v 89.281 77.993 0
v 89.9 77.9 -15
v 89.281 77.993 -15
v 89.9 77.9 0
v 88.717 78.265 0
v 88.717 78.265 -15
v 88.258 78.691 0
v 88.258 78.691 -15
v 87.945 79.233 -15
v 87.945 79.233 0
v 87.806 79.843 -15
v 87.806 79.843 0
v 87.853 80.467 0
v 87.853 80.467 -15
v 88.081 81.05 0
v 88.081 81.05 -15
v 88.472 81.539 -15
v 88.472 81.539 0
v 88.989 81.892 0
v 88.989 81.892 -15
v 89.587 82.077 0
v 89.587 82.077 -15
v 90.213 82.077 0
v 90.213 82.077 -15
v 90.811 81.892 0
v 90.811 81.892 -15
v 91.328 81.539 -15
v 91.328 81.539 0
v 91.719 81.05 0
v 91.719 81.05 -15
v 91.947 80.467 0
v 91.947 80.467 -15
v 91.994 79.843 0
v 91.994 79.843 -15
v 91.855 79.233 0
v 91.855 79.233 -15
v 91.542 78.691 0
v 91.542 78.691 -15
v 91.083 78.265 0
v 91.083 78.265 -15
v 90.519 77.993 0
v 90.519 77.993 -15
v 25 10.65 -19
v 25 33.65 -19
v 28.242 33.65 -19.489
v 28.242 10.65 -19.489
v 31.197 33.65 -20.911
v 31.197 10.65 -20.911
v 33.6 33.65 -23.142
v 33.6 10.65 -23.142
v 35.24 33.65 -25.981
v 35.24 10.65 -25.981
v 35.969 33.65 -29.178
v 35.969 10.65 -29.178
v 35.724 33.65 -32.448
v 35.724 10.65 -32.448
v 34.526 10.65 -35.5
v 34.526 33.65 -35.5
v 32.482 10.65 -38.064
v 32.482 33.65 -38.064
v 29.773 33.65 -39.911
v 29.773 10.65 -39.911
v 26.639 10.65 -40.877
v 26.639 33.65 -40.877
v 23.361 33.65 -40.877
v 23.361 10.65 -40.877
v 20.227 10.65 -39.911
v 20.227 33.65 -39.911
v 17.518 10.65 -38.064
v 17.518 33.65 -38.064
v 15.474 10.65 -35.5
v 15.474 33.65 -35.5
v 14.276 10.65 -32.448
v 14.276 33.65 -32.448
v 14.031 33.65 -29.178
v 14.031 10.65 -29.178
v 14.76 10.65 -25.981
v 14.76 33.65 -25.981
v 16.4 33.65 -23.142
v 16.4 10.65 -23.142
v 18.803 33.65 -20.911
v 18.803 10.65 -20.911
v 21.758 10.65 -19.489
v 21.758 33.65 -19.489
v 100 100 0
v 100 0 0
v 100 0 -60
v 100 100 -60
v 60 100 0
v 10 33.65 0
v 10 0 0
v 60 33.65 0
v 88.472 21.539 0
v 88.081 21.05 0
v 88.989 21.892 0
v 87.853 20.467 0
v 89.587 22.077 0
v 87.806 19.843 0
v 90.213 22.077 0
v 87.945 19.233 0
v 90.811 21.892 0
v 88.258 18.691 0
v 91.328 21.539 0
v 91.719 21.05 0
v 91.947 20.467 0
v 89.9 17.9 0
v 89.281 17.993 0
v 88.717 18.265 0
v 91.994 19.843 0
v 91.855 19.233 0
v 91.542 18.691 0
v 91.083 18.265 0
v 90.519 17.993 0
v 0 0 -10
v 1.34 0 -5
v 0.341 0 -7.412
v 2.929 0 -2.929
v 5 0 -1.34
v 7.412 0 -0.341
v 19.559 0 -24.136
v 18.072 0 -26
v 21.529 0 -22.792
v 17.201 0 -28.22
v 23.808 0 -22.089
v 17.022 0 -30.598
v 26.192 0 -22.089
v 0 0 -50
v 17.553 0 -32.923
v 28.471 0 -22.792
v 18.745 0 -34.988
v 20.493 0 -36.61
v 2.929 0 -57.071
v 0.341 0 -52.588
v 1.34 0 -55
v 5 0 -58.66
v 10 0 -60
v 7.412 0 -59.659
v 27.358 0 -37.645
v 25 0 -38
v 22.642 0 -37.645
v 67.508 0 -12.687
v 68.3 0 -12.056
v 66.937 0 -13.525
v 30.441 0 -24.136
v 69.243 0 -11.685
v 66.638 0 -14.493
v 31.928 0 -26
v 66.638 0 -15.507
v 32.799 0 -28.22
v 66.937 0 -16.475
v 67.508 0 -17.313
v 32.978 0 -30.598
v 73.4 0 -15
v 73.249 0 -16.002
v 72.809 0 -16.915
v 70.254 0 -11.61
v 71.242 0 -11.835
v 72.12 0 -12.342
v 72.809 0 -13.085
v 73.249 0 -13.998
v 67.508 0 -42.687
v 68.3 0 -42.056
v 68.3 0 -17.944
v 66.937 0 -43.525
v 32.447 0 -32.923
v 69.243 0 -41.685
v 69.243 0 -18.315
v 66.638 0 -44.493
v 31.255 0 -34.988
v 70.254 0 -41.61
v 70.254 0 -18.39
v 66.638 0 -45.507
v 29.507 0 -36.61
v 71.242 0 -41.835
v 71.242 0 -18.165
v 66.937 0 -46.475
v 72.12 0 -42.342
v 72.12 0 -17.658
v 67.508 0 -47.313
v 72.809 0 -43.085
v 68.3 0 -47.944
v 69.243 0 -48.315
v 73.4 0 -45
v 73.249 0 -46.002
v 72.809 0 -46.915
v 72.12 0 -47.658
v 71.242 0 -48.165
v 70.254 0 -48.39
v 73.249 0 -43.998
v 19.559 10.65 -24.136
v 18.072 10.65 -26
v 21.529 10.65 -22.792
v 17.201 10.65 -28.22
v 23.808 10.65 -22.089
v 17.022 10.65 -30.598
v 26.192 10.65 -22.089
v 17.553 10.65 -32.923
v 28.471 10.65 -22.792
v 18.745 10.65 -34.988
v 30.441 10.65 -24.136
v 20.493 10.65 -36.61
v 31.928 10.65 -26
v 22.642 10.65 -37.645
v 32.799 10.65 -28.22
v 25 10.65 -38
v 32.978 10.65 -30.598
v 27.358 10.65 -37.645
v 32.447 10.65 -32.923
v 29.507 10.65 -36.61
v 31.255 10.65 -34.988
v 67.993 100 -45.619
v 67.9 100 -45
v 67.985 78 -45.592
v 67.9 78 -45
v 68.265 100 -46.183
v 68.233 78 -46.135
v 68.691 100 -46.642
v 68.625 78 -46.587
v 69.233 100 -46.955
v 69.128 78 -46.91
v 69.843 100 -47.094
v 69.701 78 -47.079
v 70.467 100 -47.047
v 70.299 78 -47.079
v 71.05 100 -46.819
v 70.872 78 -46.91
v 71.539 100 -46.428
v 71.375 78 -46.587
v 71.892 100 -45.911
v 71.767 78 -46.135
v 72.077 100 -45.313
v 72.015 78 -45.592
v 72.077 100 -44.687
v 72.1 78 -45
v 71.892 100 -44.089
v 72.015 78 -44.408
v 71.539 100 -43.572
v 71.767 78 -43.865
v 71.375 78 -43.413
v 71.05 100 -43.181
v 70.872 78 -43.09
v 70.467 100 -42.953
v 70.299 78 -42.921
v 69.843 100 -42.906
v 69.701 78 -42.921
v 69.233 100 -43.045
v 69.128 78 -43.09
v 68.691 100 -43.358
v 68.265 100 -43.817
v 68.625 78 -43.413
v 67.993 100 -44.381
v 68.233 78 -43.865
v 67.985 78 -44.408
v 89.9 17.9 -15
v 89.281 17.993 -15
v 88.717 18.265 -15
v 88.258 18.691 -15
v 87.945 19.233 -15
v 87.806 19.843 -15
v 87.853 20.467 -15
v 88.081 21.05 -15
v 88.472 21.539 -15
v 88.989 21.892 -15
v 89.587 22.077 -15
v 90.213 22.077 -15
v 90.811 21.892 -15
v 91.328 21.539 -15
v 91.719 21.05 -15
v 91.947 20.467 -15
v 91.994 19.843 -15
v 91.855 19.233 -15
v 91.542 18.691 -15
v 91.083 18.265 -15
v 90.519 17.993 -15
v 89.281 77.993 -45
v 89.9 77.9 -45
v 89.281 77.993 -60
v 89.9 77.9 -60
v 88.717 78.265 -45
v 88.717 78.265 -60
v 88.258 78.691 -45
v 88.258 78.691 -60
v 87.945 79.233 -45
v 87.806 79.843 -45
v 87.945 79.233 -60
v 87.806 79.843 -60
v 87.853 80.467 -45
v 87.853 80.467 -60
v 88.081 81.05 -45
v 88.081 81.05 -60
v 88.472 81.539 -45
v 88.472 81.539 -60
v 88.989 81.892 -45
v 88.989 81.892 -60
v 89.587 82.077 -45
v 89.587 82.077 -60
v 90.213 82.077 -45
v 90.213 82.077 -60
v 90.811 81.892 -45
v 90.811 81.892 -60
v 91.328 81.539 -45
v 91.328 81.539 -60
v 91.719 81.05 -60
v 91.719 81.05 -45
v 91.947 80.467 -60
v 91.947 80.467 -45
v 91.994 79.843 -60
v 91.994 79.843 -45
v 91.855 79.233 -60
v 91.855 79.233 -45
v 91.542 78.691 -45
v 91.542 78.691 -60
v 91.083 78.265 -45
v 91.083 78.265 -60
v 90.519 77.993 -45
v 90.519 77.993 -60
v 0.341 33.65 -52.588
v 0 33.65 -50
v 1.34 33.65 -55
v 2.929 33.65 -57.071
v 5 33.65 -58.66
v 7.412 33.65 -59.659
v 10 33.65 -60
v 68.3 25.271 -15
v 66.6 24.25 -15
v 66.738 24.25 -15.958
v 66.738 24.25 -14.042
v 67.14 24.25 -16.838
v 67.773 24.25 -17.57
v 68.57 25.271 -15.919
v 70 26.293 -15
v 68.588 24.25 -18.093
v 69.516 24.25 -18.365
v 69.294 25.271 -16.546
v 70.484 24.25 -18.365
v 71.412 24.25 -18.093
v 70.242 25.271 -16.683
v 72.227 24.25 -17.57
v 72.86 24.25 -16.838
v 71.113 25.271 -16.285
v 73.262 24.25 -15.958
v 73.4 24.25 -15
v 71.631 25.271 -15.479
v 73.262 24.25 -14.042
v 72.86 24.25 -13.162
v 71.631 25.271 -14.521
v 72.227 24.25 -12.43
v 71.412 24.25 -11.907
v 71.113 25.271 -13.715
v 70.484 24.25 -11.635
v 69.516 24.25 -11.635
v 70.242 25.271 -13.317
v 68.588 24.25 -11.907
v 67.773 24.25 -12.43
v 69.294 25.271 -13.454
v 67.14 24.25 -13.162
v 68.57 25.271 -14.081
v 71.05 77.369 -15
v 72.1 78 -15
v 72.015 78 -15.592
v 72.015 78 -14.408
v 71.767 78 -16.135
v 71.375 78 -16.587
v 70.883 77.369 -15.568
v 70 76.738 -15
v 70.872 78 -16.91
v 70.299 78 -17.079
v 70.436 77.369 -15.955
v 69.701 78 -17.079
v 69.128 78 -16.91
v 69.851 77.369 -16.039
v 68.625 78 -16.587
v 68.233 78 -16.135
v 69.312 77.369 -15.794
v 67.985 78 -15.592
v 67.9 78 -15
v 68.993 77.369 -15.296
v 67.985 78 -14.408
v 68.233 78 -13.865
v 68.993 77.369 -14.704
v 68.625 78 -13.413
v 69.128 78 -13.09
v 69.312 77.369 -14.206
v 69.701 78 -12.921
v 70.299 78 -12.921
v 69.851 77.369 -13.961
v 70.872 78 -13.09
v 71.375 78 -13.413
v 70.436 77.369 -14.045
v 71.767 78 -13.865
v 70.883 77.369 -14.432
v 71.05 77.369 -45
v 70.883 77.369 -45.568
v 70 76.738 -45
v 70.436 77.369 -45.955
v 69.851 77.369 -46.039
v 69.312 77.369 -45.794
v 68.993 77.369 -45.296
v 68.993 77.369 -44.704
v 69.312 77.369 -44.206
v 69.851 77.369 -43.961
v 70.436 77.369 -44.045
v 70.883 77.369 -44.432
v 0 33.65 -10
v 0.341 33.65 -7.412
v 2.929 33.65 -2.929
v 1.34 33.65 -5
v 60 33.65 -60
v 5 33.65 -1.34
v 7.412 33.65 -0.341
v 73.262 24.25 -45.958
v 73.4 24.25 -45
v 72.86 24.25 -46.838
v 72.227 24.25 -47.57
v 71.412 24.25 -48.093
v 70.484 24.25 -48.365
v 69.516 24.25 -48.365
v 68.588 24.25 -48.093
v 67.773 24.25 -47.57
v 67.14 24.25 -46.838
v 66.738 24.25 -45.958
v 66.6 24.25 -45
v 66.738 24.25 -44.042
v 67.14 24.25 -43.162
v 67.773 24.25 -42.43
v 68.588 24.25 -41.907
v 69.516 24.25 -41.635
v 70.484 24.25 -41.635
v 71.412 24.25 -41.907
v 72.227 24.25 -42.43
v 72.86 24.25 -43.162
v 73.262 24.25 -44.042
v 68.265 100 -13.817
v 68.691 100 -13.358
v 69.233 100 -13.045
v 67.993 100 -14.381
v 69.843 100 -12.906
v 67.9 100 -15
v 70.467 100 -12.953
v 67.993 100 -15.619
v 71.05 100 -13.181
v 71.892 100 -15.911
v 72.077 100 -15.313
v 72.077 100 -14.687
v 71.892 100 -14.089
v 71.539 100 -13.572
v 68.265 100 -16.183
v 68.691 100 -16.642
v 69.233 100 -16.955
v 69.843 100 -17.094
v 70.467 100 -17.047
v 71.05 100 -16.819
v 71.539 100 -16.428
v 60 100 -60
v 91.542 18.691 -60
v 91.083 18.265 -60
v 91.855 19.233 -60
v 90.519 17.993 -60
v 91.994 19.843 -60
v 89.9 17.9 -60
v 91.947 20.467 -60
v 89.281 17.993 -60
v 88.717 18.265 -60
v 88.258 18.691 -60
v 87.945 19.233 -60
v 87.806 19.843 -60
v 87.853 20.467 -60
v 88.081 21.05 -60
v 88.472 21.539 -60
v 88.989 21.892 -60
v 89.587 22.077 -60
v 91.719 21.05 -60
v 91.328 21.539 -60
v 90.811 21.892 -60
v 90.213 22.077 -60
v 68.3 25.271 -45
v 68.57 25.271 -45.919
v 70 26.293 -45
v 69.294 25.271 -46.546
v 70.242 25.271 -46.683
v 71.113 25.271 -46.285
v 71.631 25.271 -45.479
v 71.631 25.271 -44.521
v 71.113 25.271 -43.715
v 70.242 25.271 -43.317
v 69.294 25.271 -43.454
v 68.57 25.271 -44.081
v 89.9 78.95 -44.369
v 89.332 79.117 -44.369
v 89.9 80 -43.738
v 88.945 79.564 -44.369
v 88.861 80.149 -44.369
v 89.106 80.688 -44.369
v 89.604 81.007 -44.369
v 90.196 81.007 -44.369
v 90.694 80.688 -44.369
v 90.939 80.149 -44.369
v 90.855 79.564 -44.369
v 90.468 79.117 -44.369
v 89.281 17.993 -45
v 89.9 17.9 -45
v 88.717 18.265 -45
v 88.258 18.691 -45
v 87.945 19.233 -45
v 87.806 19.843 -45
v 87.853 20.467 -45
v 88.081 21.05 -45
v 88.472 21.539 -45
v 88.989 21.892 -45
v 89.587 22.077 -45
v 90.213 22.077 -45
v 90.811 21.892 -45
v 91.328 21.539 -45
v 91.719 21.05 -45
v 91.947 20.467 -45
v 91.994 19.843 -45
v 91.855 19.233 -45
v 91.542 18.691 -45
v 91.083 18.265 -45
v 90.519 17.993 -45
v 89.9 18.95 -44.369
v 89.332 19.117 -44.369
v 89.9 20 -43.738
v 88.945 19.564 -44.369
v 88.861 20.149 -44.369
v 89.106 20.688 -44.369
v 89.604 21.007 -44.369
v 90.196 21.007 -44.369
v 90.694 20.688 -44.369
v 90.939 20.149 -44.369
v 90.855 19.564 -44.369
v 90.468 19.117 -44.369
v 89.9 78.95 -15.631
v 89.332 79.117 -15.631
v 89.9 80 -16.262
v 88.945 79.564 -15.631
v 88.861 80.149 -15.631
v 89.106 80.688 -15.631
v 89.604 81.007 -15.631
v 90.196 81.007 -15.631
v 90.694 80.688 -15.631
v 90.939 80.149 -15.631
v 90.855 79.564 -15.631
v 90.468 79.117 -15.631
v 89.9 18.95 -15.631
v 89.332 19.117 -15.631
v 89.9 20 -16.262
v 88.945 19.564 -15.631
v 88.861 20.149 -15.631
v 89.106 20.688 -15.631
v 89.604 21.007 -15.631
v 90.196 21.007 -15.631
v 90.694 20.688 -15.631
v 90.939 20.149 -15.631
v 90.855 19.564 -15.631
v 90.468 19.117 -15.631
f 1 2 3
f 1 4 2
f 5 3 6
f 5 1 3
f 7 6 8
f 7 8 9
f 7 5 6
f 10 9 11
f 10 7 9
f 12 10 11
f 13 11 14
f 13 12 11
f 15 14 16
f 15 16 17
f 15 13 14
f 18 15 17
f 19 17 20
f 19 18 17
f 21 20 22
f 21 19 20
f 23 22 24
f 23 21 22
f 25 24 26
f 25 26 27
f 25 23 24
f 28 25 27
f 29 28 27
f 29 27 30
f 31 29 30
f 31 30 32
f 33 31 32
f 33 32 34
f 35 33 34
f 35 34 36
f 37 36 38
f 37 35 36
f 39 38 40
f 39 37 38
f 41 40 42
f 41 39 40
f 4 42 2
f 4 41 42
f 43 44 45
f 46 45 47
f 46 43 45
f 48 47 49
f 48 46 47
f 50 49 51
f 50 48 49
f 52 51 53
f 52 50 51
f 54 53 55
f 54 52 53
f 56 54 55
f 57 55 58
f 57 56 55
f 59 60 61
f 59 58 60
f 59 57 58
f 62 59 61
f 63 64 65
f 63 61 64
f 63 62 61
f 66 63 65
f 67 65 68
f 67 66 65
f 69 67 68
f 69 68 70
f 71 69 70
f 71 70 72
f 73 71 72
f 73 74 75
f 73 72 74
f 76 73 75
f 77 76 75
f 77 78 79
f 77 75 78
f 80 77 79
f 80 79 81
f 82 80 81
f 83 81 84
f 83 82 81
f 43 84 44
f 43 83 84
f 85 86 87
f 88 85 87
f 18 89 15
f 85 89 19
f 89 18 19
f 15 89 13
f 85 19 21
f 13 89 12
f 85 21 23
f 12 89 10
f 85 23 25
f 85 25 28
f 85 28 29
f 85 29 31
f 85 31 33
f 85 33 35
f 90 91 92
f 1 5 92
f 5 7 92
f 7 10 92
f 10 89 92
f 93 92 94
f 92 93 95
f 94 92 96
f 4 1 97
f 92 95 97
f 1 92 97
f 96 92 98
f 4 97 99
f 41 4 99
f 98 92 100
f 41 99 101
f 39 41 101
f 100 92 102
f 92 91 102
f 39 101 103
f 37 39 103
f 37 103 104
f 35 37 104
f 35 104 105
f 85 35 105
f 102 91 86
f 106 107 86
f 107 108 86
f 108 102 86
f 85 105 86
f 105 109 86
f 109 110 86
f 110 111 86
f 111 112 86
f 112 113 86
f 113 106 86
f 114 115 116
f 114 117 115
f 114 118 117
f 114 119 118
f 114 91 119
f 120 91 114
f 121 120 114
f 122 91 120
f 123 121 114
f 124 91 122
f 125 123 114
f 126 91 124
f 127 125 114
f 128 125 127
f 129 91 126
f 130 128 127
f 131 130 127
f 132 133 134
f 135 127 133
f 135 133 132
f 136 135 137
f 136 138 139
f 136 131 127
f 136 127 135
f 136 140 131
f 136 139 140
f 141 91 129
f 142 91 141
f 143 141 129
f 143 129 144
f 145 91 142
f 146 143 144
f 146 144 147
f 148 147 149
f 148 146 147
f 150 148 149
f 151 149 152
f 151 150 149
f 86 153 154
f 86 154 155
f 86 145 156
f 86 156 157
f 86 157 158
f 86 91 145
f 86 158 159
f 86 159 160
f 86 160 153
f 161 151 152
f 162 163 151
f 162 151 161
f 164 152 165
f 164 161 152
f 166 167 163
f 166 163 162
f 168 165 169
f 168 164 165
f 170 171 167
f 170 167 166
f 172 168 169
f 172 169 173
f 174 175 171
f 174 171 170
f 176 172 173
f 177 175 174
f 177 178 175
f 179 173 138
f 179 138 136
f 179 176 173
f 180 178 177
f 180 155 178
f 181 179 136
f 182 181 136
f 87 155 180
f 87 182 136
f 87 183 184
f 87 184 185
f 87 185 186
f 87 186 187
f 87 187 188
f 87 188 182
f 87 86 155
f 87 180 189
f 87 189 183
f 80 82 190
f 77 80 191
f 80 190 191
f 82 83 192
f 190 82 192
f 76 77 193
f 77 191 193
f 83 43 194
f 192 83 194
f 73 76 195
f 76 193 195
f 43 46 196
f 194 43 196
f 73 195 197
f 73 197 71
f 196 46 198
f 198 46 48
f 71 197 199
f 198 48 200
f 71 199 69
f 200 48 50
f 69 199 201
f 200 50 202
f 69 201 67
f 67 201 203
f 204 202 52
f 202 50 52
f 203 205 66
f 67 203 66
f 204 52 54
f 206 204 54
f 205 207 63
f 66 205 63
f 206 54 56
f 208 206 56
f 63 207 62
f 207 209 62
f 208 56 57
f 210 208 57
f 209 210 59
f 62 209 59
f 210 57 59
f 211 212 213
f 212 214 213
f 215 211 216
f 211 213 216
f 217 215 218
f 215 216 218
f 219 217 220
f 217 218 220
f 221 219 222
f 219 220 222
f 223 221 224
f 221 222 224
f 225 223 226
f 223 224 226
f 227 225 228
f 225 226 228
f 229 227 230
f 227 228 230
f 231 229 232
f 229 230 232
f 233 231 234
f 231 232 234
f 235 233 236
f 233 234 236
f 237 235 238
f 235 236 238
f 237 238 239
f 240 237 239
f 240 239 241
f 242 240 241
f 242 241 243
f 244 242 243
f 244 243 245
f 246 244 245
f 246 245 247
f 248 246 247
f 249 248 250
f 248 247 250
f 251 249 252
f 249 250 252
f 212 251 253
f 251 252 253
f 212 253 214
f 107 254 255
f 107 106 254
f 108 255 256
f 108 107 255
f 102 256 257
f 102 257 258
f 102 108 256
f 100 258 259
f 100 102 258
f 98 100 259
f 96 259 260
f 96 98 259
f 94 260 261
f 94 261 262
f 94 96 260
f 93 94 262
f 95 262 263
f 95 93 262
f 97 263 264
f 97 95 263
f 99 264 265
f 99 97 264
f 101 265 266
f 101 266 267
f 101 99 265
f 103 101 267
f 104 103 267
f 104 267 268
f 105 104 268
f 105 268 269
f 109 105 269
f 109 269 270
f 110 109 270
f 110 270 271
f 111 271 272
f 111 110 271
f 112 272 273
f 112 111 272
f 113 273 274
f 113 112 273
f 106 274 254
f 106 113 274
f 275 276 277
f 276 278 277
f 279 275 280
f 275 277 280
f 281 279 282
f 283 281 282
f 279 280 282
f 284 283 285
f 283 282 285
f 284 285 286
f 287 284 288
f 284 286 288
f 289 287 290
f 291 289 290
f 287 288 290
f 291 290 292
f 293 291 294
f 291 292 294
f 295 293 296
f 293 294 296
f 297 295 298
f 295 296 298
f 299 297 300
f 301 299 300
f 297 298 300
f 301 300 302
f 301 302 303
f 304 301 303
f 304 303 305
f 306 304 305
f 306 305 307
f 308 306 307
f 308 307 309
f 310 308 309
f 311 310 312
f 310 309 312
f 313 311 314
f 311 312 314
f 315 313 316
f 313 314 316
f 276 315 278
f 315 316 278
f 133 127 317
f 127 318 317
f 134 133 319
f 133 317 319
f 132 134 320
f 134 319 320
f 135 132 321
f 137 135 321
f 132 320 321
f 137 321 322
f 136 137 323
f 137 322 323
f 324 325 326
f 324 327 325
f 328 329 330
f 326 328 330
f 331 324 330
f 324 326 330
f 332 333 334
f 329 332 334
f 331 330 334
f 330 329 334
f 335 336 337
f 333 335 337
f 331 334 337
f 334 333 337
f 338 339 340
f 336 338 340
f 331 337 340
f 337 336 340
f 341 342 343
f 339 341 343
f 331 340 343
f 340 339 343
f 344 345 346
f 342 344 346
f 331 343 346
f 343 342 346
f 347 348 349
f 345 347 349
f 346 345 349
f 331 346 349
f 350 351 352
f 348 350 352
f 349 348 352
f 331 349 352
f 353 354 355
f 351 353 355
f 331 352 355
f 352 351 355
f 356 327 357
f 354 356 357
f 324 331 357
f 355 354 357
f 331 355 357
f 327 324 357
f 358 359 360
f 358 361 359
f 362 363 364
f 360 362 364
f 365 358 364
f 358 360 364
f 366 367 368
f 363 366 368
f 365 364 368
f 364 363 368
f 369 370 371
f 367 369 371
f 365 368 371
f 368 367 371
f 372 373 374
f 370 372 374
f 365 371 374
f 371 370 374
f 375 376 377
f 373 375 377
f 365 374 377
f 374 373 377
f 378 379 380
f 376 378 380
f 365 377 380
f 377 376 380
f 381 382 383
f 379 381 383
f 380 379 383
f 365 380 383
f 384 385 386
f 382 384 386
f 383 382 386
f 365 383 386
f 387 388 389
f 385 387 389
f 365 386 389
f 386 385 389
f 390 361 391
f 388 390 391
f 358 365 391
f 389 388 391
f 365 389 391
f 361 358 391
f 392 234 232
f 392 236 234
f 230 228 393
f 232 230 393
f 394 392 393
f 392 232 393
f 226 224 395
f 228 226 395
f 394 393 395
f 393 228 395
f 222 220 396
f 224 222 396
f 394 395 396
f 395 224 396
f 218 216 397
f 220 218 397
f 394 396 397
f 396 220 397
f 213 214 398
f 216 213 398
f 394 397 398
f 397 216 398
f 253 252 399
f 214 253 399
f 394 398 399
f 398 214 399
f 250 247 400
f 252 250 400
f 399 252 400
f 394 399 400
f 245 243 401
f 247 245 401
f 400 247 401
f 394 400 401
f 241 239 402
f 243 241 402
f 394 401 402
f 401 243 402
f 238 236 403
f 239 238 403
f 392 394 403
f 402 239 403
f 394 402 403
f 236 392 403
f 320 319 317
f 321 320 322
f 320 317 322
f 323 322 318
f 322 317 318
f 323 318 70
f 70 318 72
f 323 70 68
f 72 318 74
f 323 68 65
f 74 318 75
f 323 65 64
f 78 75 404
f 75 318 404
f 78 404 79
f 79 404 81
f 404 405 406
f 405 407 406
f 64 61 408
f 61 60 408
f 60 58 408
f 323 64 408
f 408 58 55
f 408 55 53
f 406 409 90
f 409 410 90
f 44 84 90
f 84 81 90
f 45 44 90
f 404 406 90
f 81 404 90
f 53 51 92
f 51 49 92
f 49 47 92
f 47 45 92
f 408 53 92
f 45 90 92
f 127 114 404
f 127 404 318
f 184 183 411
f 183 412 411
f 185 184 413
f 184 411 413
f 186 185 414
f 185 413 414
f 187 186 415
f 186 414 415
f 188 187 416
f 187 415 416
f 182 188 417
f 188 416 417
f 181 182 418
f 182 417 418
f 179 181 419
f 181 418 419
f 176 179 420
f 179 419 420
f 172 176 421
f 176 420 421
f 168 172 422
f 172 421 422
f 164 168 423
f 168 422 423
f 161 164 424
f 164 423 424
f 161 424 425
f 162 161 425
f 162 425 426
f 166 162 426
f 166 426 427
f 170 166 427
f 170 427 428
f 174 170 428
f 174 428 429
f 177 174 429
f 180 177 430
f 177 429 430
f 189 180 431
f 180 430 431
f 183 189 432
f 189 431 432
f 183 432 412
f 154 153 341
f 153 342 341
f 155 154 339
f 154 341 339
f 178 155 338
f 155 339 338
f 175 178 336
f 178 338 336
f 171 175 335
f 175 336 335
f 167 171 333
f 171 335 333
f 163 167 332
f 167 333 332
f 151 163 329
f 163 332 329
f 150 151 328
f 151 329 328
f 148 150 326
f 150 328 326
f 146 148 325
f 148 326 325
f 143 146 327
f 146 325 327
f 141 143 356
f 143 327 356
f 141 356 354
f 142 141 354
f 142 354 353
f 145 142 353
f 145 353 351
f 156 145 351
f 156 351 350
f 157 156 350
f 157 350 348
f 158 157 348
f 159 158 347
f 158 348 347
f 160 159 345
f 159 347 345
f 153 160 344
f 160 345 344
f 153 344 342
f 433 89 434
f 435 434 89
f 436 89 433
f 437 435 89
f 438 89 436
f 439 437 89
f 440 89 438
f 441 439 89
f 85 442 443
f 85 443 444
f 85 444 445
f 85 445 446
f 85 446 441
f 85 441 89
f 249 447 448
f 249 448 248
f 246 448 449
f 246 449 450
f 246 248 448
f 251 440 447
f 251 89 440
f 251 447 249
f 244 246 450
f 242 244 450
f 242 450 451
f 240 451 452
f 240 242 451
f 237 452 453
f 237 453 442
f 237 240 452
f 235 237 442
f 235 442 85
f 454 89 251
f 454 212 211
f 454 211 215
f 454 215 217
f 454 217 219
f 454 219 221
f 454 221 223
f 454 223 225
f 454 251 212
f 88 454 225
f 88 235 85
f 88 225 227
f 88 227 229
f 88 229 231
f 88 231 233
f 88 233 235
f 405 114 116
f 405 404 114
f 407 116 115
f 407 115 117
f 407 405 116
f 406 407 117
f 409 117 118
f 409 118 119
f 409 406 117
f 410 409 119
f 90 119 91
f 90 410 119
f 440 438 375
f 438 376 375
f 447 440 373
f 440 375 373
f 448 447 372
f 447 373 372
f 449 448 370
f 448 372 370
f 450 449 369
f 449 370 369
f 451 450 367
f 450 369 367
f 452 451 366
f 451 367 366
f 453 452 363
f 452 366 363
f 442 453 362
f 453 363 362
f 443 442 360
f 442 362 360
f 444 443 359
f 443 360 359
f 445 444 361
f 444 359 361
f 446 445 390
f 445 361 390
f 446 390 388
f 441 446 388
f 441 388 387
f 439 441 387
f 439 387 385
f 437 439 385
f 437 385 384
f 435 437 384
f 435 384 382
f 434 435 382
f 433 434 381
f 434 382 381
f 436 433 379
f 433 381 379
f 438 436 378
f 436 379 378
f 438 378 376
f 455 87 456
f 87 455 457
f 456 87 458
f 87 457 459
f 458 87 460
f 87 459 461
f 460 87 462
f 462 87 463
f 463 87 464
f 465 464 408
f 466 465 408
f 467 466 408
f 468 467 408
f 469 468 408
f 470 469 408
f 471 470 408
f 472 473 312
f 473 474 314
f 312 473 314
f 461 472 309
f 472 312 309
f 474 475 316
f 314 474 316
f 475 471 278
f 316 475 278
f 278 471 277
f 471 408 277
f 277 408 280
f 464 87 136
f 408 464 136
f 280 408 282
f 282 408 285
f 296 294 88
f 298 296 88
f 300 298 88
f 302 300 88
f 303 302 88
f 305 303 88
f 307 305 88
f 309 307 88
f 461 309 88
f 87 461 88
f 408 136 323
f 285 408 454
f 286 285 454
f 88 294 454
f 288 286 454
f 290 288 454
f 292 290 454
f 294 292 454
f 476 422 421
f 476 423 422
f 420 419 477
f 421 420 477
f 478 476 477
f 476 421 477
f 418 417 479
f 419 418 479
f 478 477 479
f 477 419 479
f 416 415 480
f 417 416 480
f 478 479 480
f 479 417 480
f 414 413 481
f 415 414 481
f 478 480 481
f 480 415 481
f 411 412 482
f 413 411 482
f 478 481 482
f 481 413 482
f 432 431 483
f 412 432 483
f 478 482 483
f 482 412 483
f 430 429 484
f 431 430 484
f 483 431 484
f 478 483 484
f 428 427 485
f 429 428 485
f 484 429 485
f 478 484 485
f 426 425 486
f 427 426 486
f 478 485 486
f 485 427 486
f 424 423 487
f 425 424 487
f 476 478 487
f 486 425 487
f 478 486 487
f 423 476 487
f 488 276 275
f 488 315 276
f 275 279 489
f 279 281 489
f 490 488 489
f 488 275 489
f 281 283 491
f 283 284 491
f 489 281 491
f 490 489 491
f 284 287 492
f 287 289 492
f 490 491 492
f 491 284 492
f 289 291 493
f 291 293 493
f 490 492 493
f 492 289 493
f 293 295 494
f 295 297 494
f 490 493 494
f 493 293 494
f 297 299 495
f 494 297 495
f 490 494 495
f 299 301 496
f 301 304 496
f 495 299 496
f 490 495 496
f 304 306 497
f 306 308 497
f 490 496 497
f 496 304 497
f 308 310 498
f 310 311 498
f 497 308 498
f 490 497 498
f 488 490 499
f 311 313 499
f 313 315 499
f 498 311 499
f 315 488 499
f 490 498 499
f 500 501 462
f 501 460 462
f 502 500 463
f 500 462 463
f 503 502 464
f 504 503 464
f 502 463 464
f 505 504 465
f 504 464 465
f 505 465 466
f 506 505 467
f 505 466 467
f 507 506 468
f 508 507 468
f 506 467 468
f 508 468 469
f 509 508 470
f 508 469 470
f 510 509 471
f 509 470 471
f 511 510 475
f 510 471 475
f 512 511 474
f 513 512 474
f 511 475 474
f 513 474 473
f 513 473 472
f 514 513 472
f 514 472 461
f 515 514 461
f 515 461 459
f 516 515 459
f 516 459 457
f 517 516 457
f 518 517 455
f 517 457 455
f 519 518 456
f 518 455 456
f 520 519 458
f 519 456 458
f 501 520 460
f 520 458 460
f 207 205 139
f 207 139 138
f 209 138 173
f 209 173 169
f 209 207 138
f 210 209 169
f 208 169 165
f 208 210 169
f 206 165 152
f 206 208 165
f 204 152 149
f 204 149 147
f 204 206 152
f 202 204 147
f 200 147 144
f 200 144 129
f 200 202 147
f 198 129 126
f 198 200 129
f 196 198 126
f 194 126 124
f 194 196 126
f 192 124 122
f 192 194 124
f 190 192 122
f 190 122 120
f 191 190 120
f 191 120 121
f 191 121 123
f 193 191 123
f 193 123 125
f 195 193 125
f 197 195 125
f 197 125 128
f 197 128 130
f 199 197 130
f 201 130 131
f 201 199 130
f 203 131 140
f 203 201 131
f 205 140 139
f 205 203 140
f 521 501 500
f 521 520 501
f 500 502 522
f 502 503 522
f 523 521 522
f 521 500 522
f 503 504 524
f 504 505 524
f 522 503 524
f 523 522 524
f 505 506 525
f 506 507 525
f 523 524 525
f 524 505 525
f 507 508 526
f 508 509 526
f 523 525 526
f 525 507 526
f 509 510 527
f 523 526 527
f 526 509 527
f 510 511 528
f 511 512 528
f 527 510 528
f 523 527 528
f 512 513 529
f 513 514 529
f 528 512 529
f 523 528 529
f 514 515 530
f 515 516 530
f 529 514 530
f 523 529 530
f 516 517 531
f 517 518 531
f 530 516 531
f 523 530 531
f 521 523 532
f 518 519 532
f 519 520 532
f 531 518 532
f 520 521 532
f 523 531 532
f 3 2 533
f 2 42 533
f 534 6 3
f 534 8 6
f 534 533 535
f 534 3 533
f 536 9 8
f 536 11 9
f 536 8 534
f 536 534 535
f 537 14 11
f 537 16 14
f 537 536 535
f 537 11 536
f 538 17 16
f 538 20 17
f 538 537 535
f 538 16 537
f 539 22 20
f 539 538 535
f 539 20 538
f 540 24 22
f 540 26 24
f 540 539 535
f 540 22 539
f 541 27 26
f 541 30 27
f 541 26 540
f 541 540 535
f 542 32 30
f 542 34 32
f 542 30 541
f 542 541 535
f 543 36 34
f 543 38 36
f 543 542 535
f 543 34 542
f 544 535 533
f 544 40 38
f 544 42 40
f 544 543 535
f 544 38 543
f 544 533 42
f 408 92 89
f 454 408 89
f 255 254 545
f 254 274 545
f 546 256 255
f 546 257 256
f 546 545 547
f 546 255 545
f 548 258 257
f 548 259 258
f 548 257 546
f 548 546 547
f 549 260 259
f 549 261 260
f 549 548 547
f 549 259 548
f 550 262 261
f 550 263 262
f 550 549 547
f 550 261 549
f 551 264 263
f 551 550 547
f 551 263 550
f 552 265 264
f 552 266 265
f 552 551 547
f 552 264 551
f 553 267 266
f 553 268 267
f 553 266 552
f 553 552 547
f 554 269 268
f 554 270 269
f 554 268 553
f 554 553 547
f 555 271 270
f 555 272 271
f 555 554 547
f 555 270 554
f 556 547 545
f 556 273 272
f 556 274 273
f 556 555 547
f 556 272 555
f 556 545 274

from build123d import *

# Parameters (mm, degrees)
SKETCH1_W                  = 100
SKETCH1_H                  = 100
BOSS_EXTRUDE1_DEPTH        = 100
SKETCH2_W                  = 60
SKETCH2_H                  = 100
CUT_EXTRUDE1_DEPTH         = 174.205080757
CUT_EXTRUDE2_DEPTH         = 157.212427483
CUT_EXTRUDE2_DEPTH_BACK    = 157.212427483
SKETCH3_R                  = 11
SKETCH4_W                  = 40
SKETCH4_H                  = 100
CUT_EXTRUDE3_DEPTH         = 174.205080757
BOSS_EXTRUDE2_START        = -10.65
SKETCH5_R                  = 11
SKETCH5_R_2                = 8
BOSS_EXTRUDE2_DEPTH        = 10.65
M5_TAPPED_HOLE1_AT_2_COUNT = 2
M5_TAPPED_HOLE1_AT_2_PITCH = 60
M5_TAPPED_HOLE2_D          = 4.2
M5_TAPPED_HOLE2_DEPTH      = 22
M5_TAPPED_HOLE2_TIP        = 1.2618073
M8_TAPPED_HOLE1_D          = 6.8
M8_TAPPED_HOLE1_DEPTH      = 24.25
M8_TAPPED_HOLE1_TIP        = 2.042926105
FILLET3_R                  = 10


with BuildPart() as part:
    # Sketch1 → Boss-Extrude1 (new body)
    with BuildSketch(Plane(origin=(0, 0, 0), x_dir=(1, 0, 0), z_dir=(0, 1, 0))):
        with Locations((50, 50)):
            Rectangle(SKETCH1_W, SKETCH1_H)
    extrude(amount=BOSS_EXTRUDE1_DEPTH)

    # Sketch2 → Cut-Extrude1 (cut, through all)
    with BuildSketch(Plane.XY):
        with Locations((30, 83.65)):
            Rectangle(SKETCH2_W, SKETCH2_H)
    extrude(amount=-CUT_EXTRUDE1_DEPTH, mode=Mode.SUBTRACT)

    # Sketch3 → Cut-Extrude2 (cut, two sides: drawn at the far end of the back side and taken through both)
    with BuildSketch(Plane(origin=(0, 33.65, 0), x_dir=(1, 0, 0), z_dir=(0, 1, 0)).offset(-CUT_EXTRUDE2_DEPTH_BACK)):
        with Locations((25, 30)):
            Circle(SKETCH3_R)
    extrude(amount=CUT_EXTRUDE2_DEPTH + CUT_EXTRUDE2_DEPTH_BACK, mode=Mode.SUBTRACT)

    # Sketch4 → Cut-Extrude3 (cut, through all)
    with BuildSketch(Plane.ZY):
        with Locations((-80, 50)):
            Rectangle(SKETCH4_W, SKETCH4_H)
    extrude(amount=-CUT_EXTRUDE3_DEPTH, mode=Mode.SUBTRACT)

    # Sketch5 → Boss-Extrude2 (add)
    with BuildSketch(Plane.XZ.offset(BOSS_EXTRUDE2_START)):
        with Locations((25, -30)):
            Circle(SKETCH5_R)
        with Locations((25, -30)):
            Circle(SKETCH5_R_2, mode=Mode.SUBTRACT)
    extrude(amount=BOSS_EXTRUDE2_DEPTH)

    # Sketch11 → M5 Tapped Hole1 (revolve, cut)
    with BuildSketch(Plane(origin=(89.9, 80, 0), x_dir=(0, -1, 0), z_dir=(1, 0, 0))):
        Polygon((0, 0), (0, 16.2618073), (2.1, 15), (2.1, 0), align=None)
    m5_tapped_hole1 = revolve(axis=Axis((89.9, 80, 6.35), (0, 0, -1)), mode=Mode.SUBTRACT)

    # M5 Tapped Hole1 at 2: M5 Tapped Hole1 ×2
    with Locations(*[(0, -i * M5_TAPPED_HOLE1_AT_2_PITCH, 0) for i in range(1, M5_TAPPED_HOLE1_AT_2_COUNT)]):
        add(m5_tapped_hole1, mode=Mode.SUBTRACT)

    # Mirror1: M5 Tapped Hole1 across plane
    add(m5_tapped_hole1.mirror(Plane.XY.offset(-30)), mode=Mode.SUBTRACT)

    # Mirror1 copy 1 sketch → Mirror1 copy 1 (revolve, cut)
    with BuildSketch(Plane(origin=(89.9, 20, -60), x_dir=(0, -1, 0), z_dir=(1, 0, 0))):
        Polygon((0, 0), (0, -16.2618073), (2.1, -15), (2.1, 0), align=None)
    revolve(axis=Axis((89.9, 20, -66.35), (0, 0, -1)), mode=Mode.SUBTRACT)

    # M5 Tapped Hole2
    with Locations(Plane(origin=(0, 100, 0), x_dir=(1, 0, 0), z_dir=(0, 1, 0))):
        with Locations((70, 45), (70, 15)):
            Hole(M5_TAPPED_HOLE2_D / 2, depth=M5_TAPPED_HOLE2_DEPTH)
            with Locations((0, 0, -(M5_TAPPED_HOLE2_DEPTH + M5_TAPPED_HOLE2_TIP / 2))):  # 118° drill point
                Cone(0, M5_TAPPED_HOLE2_D / 2, M5_TAPPED_HOLE2_TIP, mode=Mode.SUBTRACT)

    # M8 Tapped Hole1
    with Locations(Plane(origin=(0, 0, 0), x_dir=(-1, 0, 0), z_dir=(0, -1, 0))):
        with Locations((-70, 15), (-70, 45)):
            Hole(M8_TAPPED_HOLE1_D / 2, depth=M8_TAPPED_HOLE1_DEPTH)
            with Locations((0, 0, -(M8_TAPPED_HOLE1_DEPTH + M8_TAPPED_HOLE1_TIP / 2))):  # 118° drill point
                Cone(0, M8_TAPPED_HOLE1_D / 2, M8_TAPPED_HOLE1_TIP, mode=Mode.SUBTRACT)

    # Fillet3
    fillet3_edges = [part.edges().sort_by_distance(p)[0] for p in [
        (0, 16.825, 0),
        (0, 16.825, -60),
    ]]
    fillet(fillet3_edges, radius=FILLET3_R)


solid = part.part
